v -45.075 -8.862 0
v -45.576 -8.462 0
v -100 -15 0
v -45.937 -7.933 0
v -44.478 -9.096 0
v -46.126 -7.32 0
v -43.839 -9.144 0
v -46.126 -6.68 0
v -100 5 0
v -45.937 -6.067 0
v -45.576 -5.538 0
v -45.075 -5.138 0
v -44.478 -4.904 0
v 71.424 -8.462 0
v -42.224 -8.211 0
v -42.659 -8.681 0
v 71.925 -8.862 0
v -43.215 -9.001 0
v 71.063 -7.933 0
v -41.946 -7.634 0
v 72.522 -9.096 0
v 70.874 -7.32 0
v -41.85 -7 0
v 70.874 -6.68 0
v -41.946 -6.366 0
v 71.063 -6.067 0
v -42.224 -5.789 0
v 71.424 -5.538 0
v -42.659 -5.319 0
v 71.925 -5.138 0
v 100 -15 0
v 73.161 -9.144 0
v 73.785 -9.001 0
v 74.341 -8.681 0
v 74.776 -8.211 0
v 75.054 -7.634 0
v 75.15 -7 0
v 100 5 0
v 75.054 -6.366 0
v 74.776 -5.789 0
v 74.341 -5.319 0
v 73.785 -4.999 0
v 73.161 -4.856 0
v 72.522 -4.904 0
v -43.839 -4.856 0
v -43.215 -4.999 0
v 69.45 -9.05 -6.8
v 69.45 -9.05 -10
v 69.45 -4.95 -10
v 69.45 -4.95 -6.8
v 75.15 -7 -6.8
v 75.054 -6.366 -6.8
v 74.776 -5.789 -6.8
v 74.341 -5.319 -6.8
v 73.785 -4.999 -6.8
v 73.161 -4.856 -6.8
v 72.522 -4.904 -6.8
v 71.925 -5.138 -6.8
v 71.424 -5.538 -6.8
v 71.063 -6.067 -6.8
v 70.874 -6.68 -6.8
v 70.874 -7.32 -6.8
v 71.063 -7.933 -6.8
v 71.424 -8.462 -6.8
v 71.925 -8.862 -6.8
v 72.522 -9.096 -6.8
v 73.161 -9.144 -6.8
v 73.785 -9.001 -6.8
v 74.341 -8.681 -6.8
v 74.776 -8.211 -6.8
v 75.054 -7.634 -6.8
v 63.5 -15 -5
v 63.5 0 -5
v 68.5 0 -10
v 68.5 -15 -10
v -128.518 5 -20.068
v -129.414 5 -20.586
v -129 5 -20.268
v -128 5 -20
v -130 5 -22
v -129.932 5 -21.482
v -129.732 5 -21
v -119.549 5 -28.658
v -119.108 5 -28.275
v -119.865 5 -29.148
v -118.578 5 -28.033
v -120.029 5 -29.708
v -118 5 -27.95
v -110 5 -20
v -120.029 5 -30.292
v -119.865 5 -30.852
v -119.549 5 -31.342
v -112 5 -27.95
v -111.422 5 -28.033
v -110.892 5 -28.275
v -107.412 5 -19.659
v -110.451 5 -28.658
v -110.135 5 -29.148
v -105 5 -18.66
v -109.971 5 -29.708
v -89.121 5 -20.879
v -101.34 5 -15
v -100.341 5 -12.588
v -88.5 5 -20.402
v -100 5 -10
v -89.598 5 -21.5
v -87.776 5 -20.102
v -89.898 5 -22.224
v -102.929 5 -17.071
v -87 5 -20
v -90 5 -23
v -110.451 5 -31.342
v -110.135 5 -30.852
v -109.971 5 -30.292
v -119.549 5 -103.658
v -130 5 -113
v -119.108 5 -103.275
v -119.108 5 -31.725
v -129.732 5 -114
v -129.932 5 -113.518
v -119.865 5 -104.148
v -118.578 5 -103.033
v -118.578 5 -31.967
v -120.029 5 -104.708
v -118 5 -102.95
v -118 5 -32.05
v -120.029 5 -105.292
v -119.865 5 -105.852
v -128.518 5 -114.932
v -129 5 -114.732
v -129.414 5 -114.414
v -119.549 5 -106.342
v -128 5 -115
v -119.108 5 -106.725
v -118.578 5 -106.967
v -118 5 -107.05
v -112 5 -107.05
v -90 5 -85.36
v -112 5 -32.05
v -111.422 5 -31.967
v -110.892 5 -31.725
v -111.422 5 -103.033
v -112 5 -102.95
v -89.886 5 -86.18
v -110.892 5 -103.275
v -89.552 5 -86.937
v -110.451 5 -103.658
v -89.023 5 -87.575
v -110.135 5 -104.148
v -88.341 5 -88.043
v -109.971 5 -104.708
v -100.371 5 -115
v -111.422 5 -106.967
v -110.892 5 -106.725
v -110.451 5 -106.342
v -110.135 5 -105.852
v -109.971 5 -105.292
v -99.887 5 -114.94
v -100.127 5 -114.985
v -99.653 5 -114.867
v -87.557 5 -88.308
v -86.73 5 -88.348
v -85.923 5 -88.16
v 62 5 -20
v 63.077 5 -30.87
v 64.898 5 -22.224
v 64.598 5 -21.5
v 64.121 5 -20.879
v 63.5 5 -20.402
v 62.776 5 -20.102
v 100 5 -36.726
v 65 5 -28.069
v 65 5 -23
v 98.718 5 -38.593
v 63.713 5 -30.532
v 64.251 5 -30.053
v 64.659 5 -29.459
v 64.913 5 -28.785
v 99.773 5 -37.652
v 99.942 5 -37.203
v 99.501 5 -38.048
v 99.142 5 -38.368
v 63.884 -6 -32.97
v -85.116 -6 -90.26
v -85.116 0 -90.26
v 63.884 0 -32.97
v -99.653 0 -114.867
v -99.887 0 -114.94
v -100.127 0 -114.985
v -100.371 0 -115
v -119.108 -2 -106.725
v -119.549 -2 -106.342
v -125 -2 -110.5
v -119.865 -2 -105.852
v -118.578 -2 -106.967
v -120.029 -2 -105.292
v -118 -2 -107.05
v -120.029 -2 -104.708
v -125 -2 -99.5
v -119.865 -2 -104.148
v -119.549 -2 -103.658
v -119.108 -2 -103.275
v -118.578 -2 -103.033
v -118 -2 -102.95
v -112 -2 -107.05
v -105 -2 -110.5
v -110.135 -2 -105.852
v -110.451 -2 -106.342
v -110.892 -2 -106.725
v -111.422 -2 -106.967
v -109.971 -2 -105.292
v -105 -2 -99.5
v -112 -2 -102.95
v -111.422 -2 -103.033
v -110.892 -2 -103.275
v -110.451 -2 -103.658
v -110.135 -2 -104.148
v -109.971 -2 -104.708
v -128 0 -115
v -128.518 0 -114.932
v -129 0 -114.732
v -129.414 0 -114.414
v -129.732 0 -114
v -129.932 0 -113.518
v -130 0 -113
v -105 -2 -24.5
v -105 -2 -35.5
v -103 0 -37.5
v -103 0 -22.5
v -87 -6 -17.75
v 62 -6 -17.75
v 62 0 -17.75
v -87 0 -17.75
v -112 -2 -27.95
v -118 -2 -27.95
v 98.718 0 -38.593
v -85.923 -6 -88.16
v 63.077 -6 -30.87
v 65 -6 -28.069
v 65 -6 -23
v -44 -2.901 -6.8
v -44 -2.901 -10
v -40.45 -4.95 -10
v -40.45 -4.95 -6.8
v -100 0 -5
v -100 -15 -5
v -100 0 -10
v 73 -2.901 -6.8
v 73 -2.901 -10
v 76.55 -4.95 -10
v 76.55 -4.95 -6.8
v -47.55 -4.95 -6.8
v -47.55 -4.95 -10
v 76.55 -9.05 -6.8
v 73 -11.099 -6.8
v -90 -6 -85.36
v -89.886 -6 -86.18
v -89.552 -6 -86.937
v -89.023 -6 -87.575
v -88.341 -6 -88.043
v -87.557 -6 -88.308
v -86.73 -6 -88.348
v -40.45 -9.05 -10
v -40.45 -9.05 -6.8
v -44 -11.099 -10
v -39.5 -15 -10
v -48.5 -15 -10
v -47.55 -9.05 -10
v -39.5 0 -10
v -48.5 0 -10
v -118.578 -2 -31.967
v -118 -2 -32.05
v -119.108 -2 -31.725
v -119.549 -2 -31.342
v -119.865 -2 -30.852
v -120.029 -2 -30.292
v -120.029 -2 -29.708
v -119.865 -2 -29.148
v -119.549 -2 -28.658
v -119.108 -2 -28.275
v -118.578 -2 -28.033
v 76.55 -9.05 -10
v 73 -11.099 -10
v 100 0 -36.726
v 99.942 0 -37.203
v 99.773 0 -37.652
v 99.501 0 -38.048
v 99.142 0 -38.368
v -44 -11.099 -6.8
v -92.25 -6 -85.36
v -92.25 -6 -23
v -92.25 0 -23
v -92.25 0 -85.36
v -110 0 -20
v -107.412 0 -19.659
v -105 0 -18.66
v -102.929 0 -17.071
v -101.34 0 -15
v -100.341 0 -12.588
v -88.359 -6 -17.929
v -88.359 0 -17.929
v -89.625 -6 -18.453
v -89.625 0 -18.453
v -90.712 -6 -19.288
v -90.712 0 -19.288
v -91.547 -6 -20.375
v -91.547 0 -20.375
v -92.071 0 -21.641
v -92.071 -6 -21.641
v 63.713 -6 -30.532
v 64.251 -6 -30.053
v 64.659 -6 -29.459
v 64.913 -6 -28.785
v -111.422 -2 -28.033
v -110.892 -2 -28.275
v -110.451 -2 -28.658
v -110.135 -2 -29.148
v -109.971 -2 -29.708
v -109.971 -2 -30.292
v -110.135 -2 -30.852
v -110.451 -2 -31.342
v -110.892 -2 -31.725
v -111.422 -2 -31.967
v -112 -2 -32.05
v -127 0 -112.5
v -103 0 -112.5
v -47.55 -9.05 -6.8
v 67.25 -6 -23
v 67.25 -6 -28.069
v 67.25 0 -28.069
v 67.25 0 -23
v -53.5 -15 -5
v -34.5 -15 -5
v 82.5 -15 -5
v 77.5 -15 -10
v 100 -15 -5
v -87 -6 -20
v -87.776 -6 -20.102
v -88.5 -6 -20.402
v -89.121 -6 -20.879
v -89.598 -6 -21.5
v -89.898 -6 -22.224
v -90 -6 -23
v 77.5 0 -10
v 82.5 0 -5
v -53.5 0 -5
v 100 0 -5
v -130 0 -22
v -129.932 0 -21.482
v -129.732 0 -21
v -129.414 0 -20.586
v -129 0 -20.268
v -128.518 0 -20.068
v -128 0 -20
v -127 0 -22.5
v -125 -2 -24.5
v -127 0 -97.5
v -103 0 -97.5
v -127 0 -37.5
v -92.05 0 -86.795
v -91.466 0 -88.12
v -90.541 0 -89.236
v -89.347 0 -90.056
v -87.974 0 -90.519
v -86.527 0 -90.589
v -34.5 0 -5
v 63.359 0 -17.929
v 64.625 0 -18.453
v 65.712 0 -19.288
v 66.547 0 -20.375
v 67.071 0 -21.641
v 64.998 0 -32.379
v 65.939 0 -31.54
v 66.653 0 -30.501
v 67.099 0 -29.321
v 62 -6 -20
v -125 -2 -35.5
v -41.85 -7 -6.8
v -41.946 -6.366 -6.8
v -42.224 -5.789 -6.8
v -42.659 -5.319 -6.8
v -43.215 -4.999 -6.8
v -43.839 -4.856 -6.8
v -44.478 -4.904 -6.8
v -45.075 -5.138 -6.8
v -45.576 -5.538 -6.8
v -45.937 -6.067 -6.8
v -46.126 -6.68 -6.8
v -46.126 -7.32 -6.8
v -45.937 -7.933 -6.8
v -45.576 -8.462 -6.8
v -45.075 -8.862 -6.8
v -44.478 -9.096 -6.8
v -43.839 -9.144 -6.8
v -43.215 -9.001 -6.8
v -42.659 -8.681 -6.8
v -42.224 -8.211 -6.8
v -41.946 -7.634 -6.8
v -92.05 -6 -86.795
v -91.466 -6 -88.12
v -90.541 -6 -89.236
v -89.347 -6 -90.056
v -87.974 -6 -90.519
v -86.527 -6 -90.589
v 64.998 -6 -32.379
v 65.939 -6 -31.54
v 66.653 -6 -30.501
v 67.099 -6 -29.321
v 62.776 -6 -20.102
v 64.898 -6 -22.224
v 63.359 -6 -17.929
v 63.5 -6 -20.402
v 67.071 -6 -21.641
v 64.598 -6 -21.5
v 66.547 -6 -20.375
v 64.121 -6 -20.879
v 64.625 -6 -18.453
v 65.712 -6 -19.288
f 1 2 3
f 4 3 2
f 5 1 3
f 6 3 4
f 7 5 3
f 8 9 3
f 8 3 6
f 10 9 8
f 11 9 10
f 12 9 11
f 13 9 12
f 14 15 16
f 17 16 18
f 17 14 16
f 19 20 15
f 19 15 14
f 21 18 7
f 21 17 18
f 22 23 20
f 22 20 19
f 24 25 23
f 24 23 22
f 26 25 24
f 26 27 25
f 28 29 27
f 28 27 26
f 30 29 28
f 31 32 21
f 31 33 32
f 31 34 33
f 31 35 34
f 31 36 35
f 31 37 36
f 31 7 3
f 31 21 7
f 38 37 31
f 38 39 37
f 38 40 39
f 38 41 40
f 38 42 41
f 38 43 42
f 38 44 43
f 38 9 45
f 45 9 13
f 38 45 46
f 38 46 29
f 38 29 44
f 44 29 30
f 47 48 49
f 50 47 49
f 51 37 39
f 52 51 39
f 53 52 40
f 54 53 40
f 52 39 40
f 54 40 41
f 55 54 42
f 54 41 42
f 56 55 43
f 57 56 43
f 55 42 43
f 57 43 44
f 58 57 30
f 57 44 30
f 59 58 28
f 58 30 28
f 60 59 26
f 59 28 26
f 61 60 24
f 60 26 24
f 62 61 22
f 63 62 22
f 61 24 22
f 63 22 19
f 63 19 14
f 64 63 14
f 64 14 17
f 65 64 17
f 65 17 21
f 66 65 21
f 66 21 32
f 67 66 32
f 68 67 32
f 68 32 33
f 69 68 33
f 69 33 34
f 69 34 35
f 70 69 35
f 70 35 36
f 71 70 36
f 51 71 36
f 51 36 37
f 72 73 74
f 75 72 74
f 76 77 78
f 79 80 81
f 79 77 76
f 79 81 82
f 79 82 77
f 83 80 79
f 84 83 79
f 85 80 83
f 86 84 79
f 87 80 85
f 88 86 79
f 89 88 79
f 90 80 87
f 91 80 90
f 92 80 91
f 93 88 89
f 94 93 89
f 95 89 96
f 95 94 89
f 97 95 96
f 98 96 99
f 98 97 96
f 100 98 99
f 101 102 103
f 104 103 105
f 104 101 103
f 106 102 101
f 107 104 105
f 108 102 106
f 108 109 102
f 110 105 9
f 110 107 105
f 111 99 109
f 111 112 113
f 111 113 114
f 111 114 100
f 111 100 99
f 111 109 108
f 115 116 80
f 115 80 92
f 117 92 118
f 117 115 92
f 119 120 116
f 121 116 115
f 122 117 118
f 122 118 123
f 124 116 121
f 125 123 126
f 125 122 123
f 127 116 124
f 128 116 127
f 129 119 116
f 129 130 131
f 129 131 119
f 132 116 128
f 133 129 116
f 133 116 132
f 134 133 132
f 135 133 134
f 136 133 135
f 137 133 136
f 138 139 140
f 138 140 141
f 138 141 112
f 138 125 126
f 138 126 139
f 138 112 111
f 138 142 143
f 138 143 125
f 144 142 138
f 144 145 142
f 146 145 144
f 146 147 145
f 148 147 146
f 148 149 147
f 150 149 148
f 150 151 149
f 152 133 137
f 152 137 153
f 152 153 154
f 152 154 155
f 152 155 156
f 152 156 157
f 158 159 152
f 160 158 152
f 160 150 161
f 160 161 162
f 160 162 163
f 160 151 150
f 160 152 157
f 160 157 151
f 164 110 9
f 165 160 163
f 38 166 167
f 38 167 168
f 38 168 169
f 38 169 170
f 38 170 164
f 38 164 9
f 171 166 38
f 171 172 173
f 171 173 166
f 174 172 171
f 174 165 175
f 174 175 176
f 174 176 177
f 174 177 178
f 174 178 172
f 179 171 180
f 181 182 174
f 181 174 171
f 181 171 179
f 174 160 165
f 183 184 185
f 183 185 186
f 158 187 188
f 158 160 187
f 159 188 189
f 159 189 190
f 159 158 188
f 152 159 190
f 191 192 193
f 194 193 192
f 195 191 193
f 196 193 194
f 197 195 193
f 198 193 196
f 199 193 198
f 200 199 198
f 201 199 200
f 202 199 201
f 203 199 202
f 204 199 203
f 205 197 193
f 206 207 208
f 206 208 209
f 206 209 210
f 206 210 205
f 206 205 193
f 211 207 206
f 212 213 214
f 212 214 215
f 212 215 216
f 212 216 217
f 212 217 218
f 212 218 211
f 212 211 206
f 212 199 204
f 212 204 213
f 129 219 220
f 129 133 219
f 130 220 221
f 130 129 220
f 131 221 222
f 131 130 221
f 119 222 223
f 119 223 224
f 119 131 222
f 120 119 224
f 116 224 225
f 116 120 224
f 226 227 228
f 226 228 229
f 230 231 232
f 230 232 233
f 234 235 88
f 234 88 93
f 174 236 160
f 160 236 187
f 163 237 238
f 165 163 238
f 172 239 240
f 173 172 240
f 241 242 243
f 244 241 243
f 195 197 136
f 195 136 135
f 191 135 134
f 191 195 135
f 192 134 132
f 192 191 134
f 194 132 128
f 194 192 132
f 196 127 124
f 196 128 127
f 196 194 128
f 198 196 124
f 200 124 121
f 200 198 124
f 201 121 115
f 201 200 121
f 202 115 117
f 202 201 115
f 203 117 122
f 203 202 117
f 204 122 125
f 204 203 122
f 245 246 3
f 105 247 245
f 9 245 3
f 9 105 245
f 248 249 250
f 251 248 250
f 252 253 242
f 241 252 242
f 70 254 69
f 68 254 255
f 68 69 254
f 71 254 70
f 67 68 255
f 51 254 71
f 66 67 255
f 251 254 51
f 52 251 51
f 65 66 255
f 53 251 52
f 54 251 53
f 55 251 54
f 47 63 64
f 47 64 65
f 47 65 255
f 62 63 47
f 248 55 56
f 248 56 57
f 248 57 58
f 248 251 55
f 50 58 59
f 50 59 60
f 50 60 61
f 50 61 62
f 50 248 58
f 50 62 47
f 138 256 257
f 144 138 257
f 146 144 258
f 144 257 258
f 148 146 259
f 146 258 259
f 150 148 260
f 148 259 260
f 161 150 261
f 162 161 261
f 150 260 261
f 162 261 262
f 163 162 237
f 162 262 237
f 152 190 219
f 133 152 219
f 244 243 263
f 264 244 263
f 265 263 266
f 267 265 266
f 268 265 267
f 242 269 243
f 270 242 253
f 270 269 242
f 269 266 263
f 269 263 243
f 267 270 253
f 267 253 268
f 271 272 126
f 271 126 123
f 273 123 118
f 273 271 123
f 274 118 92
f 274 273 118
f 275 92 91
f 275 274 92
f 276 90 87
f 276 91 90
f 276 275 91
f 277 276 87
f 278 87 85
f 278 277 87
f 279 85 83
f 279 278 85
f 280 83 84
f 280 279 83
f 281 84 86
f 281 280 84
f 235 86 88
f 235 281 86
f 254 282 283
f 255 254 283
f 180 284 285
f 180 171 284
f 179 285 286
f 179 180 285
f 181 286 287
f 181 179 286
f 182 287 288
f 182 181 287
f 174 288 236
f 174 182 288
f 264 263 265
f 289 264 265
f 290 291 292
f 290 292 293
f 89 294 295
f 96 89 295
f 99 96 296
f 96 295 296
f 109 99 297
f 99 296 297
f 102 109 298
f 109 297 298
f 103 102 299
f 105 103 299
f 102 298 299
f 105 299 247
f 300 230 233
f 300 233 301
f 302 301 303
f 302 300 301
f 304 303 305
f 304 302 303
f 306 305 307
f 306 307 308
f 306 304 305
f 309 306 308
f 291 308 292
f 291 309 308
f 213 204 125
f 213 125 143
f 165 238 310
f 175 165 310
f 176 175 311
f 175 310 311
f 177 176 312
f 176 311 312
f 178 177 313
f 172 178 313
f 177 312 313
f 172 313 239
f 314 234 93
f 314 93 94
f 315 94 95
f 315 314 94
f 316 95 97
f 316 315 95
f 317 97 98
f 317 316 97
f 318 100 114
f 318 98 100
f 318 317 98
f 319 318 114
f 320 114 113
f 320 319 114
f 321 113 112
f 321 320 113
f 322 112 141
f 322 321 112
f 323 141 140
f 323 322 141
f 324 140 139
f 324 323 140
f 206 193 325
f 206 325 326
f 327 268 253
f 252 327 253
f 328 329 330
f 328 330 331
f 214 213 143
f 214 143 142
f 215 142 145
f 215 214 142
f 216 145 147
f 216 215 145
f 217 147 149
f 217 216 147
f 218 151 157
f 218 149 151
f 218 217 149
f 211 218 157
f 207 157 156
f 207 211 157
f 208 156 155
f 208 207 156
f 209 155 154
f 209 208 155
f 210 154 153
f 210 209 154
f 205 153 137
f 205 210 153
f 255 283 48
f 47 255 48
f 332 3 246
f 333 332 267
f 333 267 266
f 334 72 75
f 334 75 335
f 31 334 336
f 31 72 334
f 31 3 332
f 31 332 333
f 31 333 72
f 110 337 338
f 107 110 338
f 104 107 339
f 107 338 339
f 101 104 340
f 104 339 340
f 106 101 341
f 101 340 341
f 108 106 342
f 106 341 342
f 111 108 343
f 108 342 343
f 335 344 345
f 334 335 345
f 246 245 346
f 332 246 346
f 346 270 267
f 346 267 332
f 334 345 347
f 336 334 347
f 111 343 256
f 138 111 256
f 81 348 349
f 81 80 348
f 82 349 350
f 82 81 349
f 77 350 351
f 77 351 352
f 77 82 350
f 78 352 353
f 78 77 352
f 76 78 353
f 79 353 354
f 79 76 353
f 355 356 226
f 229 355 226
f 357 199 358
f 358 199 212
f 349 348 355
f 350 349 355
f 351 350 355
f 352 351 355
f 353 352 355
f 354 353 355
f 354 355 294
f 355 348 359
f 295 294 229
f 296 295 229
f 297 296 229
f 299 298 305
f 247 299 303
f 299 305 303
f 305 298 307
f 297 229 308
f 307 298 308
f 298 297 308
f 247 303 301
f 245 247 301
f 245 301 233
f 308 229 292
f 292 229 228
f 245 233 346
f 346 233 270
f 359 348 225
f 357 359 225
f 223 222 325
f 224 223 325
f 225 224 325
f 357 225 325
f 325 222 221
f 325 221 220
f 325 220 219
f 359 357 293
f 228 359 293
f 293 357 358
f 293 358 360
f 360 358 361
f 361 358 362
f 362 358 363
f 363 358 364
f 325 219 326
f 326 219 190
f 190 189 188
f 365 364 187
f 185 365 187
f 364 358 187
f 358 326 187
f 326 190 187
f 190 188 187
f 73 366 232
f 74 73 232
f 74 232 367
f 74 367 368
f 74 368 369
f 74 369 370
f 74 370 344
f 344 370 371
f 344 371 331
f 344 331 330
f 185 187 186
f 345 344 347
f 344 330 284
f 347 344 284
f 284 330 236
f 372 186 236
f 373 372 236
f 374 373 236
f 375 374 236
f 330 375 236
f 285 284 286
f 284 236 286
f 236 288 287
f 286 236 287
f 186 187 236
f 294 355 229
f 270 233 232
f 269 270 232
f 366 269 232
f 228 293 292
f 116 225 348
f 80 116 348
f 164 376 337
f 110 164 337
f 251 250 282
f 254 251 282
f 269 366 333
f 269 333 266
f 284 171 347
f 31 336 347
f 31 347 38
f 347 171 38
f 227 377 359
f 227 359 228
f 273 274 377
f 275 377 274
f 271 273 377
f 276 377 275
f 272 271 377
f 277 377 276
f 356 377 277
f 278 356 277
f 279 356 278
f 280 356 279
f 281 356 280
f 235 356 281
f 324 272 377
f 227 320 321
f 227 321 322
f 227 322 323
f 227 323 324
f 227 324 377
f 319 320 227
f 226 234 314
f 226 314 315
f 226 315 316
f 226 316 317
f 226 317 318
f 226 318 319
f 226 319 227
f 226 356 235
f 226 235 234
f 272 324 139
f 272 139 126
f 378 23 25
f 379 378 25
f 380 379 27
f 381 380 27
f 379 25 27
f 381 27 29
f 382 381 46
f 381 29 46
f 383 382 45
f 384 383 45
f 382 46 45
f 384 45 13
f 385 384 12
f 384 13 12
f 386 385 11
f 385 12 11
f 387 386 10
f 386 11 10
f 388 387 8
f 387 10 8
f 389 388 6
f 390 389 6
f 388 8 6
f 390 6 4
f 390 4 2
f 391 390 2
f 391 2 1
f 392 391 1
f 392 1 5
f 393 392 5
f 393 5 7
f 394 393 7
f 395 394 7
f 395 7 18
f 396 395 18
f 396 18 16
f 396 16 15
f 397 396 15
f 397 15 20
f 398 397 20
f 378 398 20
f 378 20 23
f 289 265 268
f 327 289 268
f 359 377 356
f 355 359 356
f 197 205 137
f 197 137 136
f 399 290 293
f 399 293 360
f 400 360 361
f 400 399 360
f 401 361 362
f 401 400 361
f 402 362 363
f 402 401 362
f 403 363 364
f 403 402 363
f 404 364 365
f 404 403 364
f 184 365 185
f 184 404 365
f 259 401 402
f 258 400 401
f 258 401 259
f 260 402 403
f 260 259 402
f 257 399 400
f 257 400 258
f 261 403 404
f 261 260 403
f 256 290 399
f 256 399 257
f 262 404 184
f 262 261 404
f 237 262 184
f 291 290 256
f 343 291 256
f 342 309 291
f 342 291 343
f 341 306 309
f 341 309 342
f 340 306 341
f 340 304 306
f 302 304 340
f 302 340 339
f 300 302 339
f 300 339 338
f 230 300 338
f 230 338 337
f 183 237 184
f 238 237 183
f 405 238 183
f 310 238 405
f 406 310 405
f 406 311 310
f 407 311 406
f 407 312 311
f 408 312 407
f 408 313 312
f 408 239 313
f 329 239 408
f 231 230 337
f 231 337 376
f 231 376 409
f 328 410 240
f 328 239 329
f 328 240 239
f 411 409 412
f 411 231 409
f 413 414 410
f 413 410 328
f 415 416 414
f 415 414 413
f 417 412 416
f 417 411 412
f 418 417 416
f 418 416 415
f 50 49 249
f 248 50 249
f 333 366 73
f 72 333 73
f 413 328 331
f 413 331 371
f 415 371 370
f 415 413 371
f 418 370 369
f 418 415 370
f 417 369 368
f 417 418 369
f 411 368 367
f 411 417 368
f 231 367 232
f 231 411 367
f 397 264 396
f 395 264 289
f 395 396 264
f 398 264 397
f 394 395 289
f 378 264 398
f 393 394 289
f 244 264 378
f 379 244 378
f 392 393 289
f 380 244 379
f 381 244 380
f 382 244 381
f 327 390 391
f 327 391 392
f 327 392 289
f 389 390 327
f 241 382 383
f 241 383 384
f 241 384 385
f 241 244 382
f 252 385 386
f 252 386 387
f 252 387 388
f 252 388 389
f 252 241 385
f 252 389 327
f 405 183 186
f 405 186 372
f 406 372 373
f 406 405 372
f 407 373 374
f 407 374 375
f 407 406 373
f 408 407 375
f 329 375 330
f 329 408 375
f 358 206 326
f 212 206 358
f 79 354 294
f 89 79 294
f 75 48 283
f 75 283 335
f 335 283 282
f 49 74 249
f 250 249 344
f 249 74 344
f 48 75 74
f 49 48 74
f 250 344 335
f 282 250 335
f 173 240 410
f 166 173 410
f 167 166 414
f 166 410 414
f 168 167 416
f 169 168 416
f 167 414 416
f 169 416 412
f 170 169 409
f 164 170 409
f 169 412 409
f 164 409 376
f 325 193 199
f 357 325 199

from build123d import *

# Parameters (mm, degrees)
BOSS_EXTRUDE1_DEPTH = 5
SKETCH2_W           = 200
SKETCH2_H           = 5
BOSS_EXTRUDE2_DEPTH = 15
BOSS_EXTRUDE3_DEPTH = 15
SKETCH6_R           = 2.15
CUT_EXTRUDE2_DEPTH  = 175.212513902
CUT_EXTRUDE3_DEPTH  = 3.2
SKETCH9_W           = 20
SKETCH9_H           = 11
BOSS_EXTRUDE4_DEPTH = 2
CHAMFER1_SIZE       = 2
CUT_EXTRUDE4_DEPTH  = 175.051716452
CUT_EXTRUDE5_DEPTH  = 175.212513902
BOSS_EXTRUDE5_START = 6
BOSS_EXTRUDE5_DEPTH = 6
FILLET1_R           = 2


with BuildPart() as part:
    # Sketch1 → Boss-Extrude1 (new body)
    with BuildSketch(Plane(origin=(0, 0, 0), x_dir=(1, 0, 0), z_dir=(0, 1, 0))):
        with BuildLine():
            Line((-100, 0), (100, 0))
            Line((100, 0), (100, 38.1))
            Line((100, 38.1), (-100, 115))
            Line((-100, 115), (-130, 115))
            Line((-130, 115), (-130, 20))
            Line((-130, 20), (-110, 20))
            ThreePointArc((-110, 20), (-102.928932188, 17.071067812), (-100, 10))
            Line((-100, 10), (-100, 0))
        make_face()
    extrude(amount=BOSS_EXTRUDE1_DEPTH)

    # Sketch2 → Boss-Extrude2 (add)
    with BuildSketch(Plane.XZ):
        with Locations((0, -2.5)):
            Rectangle(SKETCH2_W, SKETCH2_H)
    extrude(amount=BOSS_EXTRUDE2_DEPTH)

    # Sketch5 → Boss-Extrude3 (add)
    with BuildSketch(Plane.XZ):
        Polygon((-53.5, -5), (-34.5, -5), (-39.5, -10), (-48.5, -10), align=None)
        Polygon((68.5, -10), (77.5, -10), (82.5, -5), (63.5, -5), align=None)
    extrude(amount=BOSS_EXTRUDE3_DEPTH)

    # Sketch6 → Cut-Extrude2 (cut, through all)
    with BuildSketch(Plane.XY):
        with Locations((-44, -7)):
            Circle(SKETCH6_R)
        with Locations((73, -7)):
            Circle(SKETCH6_R)
    extrude(amount=-CUT_EXTRUDE2_DEPTH, mode=Mode.SUBTRACT)

    # Sketch7 → Cut-Extrude3 (cut)
    with BuildSketch(Plane(origin=(0, 0, -10), x_dir=(-1, 0, 0), z_dir=(0, 0, -1))):
        Polygon((-73, -11.099186911), (-69.45, -9.049593456), (-69.45, -4.950406544), (-73, -2.900813089), (-76.55, -4.950406544), (-76.55, -9.049593456), align=None)
        Polygon((47.55, -9.049593456), (47.55, -4.950406544), (44, -2.900813089), (40.45, -4.950406544), (40.45, -9.049593456), (44, -11.099186911), align=None)
    extrude(amount=-CUT_EXTRUDE3_DEPTH, mode=Mode.SUBTRACT)

    # Sketch9 → Boss-Extrude4 (add)
    with BuildSketch(Plane.XZ):
        with Locations((-115, -30)):
            Rectangle(SKETCH9_W, SKETCH9_H)
        with Locations((-115, -105)):
            Rectangle(SKETCH9_W, SKETCH9_H)
    extrude(amount=BOSS_EXTRUDE4_DEPTH)

    # Chamfer1
    chamfer1_edges = [part.edges().sort_by_distance(p)[0] for p in [
        (-105, 0, -30),
        (-115, 0, -35.5),
        (-115, 0, -24.5),
        (-125, 0, -30),
        (-115, 0, -99.5),
        (-125, 0, -105),
        (-105, 0, -105),
        (-115, 0, -110.5),
    ]]
    chamfer(chamfer1_edges, length=CHAMFER1_SIZE - 0.0001)  # a hair under: the kernel refuses the full size

    # Sketch8 → Cut-Extrude4 (cut, through all)
    with BuildSketch(Plane.XZ.offset(2)):
        with BuildLine():
            Line((-118, -27.95), (-112, -27.95))
            ThreePointArc((-112, -27.95), (-109.95, -30), (-112, -32.05))
            Line((-112, -32.05), (-118, -32.05))
            ThreePointArc((-118, -32.05), (-120.05, -30), (-118, -27.95))
        make_face()
        with BuildLine():
            Line((-118, -102.95), (-112, -102.95))
            ThreePointArc((-112, -102.95), (-109.95, -105), (-112, -107.05))
            Line((-112, -107.05), (-118, -107.05))
            ThreePointArc((-118, -107.05), (-120.05, -105), (-118, -102.95))
        make_face()
    extrude(amount=-CUT_EXTRUDE4_DEPTH, mode=Mode.SUBTRACT)

    # Sketch10 → Cut-Extrude5 (cut, through all)
    with BuildSketch(Plane.XZ):
        with BuildLine():
            Line((-90, -31.398310884), (-90, -85.359919445))
            ThreePointArc((-90, -85.359919445), (-88.698533585, -87.832768745), (-85.923344225, -88.160064502))
            Line((-85.923344225, -88.160064502), (63.076655775, -30.869564502))
            ThreePointArc((63.076655775, -30.869564502), (64.4728493, -29.76795303), (65, -28.069419445))
            Line((65, -28.069419445), (65, -23))
            ThreePointArc((65, -23), (64.121320344, -20.878679656), (62, -20))
            Line((62, -20), (-87, -20))
            ThreePointArc((-87, -20), (-89.121320344, -20.878679656), (-90, -23))
            Line((-90, -23), (-90, -31.398310884))
        make_face()
    extrude(amount=-CUT_EXTRUDE5_DEPTH, mode=Mode.SUBTRACT)

    # Sketch11 → Boss-Extrude5 (add)
    with BuildSketch(Plane.XZ.offset(BOSS_EXTRUDE5_START)):
        with BuildLine():
            Line((62, -17.75), (-87, -17.75))
            ThreePointArc((-87, -17.75), (-90.712310601, -19.287689399), (-92.25, -23))
            Line((-92.25, -23), (-92.25, -85.359919445))
            ThreePointArc((-92.25, -85.359919445), (-89.972433773, -89.68740572), (-85.115852394, -90.260173296))
            Line((-85.115852394, -90.260173296), (63.884147606, -32.969673296))
            ThreePointArc((63.884147606, -32.969673296), (66.327486275, -31.041853218), (67.25, -28.069419445))
            Line((67.25, -28.069419445), (67.25, -23))
            ThreePointArc((67.25, -23), (65.712310601, -19.287689399), (62, -17.75))
        make_face()
        with BuildLine():
            Line((-90, -23), (-90, -85.359919445))
            ThreePointArc((-90, -85.359919445), (-88.698533585, -87.832768745), (-85.923344225, -88.160064502))
            Line((-85.923344225, -88.160064502), (63.076655775, -30.869564502))
            ThreePointArc((63.076655775, -30.869564502), (64.4728493, -29.76795303), (65, -28.069419445))
            Line((65, -28.069419445), (65, -23))
            ThreePointArc((65, -23), (64.121320344, -20.878679656), (62, -20))
            Line((62, -20), (-87, -20))
            ThreePointArc((-87, -20), (-89.121320344, -20.878679656), (-90, -23))
        make_face(mode=Mode.SUBTRACT)
    extrude(amount=-BOSS_EXTRUDE5_DEPTH)

    # Fillet1
    fillet1_edges = [part.edges().sort_by_distance(p)[0] for p in [
        (-130, 2.5, -115),
        (-130, 2.5, -20),
        (100, 2.5, -38.1),
        (-100, 2.5, -115),
    ]]
    fillet(fillet1_edges, radius=FILLET1_R)


solid = part.part
